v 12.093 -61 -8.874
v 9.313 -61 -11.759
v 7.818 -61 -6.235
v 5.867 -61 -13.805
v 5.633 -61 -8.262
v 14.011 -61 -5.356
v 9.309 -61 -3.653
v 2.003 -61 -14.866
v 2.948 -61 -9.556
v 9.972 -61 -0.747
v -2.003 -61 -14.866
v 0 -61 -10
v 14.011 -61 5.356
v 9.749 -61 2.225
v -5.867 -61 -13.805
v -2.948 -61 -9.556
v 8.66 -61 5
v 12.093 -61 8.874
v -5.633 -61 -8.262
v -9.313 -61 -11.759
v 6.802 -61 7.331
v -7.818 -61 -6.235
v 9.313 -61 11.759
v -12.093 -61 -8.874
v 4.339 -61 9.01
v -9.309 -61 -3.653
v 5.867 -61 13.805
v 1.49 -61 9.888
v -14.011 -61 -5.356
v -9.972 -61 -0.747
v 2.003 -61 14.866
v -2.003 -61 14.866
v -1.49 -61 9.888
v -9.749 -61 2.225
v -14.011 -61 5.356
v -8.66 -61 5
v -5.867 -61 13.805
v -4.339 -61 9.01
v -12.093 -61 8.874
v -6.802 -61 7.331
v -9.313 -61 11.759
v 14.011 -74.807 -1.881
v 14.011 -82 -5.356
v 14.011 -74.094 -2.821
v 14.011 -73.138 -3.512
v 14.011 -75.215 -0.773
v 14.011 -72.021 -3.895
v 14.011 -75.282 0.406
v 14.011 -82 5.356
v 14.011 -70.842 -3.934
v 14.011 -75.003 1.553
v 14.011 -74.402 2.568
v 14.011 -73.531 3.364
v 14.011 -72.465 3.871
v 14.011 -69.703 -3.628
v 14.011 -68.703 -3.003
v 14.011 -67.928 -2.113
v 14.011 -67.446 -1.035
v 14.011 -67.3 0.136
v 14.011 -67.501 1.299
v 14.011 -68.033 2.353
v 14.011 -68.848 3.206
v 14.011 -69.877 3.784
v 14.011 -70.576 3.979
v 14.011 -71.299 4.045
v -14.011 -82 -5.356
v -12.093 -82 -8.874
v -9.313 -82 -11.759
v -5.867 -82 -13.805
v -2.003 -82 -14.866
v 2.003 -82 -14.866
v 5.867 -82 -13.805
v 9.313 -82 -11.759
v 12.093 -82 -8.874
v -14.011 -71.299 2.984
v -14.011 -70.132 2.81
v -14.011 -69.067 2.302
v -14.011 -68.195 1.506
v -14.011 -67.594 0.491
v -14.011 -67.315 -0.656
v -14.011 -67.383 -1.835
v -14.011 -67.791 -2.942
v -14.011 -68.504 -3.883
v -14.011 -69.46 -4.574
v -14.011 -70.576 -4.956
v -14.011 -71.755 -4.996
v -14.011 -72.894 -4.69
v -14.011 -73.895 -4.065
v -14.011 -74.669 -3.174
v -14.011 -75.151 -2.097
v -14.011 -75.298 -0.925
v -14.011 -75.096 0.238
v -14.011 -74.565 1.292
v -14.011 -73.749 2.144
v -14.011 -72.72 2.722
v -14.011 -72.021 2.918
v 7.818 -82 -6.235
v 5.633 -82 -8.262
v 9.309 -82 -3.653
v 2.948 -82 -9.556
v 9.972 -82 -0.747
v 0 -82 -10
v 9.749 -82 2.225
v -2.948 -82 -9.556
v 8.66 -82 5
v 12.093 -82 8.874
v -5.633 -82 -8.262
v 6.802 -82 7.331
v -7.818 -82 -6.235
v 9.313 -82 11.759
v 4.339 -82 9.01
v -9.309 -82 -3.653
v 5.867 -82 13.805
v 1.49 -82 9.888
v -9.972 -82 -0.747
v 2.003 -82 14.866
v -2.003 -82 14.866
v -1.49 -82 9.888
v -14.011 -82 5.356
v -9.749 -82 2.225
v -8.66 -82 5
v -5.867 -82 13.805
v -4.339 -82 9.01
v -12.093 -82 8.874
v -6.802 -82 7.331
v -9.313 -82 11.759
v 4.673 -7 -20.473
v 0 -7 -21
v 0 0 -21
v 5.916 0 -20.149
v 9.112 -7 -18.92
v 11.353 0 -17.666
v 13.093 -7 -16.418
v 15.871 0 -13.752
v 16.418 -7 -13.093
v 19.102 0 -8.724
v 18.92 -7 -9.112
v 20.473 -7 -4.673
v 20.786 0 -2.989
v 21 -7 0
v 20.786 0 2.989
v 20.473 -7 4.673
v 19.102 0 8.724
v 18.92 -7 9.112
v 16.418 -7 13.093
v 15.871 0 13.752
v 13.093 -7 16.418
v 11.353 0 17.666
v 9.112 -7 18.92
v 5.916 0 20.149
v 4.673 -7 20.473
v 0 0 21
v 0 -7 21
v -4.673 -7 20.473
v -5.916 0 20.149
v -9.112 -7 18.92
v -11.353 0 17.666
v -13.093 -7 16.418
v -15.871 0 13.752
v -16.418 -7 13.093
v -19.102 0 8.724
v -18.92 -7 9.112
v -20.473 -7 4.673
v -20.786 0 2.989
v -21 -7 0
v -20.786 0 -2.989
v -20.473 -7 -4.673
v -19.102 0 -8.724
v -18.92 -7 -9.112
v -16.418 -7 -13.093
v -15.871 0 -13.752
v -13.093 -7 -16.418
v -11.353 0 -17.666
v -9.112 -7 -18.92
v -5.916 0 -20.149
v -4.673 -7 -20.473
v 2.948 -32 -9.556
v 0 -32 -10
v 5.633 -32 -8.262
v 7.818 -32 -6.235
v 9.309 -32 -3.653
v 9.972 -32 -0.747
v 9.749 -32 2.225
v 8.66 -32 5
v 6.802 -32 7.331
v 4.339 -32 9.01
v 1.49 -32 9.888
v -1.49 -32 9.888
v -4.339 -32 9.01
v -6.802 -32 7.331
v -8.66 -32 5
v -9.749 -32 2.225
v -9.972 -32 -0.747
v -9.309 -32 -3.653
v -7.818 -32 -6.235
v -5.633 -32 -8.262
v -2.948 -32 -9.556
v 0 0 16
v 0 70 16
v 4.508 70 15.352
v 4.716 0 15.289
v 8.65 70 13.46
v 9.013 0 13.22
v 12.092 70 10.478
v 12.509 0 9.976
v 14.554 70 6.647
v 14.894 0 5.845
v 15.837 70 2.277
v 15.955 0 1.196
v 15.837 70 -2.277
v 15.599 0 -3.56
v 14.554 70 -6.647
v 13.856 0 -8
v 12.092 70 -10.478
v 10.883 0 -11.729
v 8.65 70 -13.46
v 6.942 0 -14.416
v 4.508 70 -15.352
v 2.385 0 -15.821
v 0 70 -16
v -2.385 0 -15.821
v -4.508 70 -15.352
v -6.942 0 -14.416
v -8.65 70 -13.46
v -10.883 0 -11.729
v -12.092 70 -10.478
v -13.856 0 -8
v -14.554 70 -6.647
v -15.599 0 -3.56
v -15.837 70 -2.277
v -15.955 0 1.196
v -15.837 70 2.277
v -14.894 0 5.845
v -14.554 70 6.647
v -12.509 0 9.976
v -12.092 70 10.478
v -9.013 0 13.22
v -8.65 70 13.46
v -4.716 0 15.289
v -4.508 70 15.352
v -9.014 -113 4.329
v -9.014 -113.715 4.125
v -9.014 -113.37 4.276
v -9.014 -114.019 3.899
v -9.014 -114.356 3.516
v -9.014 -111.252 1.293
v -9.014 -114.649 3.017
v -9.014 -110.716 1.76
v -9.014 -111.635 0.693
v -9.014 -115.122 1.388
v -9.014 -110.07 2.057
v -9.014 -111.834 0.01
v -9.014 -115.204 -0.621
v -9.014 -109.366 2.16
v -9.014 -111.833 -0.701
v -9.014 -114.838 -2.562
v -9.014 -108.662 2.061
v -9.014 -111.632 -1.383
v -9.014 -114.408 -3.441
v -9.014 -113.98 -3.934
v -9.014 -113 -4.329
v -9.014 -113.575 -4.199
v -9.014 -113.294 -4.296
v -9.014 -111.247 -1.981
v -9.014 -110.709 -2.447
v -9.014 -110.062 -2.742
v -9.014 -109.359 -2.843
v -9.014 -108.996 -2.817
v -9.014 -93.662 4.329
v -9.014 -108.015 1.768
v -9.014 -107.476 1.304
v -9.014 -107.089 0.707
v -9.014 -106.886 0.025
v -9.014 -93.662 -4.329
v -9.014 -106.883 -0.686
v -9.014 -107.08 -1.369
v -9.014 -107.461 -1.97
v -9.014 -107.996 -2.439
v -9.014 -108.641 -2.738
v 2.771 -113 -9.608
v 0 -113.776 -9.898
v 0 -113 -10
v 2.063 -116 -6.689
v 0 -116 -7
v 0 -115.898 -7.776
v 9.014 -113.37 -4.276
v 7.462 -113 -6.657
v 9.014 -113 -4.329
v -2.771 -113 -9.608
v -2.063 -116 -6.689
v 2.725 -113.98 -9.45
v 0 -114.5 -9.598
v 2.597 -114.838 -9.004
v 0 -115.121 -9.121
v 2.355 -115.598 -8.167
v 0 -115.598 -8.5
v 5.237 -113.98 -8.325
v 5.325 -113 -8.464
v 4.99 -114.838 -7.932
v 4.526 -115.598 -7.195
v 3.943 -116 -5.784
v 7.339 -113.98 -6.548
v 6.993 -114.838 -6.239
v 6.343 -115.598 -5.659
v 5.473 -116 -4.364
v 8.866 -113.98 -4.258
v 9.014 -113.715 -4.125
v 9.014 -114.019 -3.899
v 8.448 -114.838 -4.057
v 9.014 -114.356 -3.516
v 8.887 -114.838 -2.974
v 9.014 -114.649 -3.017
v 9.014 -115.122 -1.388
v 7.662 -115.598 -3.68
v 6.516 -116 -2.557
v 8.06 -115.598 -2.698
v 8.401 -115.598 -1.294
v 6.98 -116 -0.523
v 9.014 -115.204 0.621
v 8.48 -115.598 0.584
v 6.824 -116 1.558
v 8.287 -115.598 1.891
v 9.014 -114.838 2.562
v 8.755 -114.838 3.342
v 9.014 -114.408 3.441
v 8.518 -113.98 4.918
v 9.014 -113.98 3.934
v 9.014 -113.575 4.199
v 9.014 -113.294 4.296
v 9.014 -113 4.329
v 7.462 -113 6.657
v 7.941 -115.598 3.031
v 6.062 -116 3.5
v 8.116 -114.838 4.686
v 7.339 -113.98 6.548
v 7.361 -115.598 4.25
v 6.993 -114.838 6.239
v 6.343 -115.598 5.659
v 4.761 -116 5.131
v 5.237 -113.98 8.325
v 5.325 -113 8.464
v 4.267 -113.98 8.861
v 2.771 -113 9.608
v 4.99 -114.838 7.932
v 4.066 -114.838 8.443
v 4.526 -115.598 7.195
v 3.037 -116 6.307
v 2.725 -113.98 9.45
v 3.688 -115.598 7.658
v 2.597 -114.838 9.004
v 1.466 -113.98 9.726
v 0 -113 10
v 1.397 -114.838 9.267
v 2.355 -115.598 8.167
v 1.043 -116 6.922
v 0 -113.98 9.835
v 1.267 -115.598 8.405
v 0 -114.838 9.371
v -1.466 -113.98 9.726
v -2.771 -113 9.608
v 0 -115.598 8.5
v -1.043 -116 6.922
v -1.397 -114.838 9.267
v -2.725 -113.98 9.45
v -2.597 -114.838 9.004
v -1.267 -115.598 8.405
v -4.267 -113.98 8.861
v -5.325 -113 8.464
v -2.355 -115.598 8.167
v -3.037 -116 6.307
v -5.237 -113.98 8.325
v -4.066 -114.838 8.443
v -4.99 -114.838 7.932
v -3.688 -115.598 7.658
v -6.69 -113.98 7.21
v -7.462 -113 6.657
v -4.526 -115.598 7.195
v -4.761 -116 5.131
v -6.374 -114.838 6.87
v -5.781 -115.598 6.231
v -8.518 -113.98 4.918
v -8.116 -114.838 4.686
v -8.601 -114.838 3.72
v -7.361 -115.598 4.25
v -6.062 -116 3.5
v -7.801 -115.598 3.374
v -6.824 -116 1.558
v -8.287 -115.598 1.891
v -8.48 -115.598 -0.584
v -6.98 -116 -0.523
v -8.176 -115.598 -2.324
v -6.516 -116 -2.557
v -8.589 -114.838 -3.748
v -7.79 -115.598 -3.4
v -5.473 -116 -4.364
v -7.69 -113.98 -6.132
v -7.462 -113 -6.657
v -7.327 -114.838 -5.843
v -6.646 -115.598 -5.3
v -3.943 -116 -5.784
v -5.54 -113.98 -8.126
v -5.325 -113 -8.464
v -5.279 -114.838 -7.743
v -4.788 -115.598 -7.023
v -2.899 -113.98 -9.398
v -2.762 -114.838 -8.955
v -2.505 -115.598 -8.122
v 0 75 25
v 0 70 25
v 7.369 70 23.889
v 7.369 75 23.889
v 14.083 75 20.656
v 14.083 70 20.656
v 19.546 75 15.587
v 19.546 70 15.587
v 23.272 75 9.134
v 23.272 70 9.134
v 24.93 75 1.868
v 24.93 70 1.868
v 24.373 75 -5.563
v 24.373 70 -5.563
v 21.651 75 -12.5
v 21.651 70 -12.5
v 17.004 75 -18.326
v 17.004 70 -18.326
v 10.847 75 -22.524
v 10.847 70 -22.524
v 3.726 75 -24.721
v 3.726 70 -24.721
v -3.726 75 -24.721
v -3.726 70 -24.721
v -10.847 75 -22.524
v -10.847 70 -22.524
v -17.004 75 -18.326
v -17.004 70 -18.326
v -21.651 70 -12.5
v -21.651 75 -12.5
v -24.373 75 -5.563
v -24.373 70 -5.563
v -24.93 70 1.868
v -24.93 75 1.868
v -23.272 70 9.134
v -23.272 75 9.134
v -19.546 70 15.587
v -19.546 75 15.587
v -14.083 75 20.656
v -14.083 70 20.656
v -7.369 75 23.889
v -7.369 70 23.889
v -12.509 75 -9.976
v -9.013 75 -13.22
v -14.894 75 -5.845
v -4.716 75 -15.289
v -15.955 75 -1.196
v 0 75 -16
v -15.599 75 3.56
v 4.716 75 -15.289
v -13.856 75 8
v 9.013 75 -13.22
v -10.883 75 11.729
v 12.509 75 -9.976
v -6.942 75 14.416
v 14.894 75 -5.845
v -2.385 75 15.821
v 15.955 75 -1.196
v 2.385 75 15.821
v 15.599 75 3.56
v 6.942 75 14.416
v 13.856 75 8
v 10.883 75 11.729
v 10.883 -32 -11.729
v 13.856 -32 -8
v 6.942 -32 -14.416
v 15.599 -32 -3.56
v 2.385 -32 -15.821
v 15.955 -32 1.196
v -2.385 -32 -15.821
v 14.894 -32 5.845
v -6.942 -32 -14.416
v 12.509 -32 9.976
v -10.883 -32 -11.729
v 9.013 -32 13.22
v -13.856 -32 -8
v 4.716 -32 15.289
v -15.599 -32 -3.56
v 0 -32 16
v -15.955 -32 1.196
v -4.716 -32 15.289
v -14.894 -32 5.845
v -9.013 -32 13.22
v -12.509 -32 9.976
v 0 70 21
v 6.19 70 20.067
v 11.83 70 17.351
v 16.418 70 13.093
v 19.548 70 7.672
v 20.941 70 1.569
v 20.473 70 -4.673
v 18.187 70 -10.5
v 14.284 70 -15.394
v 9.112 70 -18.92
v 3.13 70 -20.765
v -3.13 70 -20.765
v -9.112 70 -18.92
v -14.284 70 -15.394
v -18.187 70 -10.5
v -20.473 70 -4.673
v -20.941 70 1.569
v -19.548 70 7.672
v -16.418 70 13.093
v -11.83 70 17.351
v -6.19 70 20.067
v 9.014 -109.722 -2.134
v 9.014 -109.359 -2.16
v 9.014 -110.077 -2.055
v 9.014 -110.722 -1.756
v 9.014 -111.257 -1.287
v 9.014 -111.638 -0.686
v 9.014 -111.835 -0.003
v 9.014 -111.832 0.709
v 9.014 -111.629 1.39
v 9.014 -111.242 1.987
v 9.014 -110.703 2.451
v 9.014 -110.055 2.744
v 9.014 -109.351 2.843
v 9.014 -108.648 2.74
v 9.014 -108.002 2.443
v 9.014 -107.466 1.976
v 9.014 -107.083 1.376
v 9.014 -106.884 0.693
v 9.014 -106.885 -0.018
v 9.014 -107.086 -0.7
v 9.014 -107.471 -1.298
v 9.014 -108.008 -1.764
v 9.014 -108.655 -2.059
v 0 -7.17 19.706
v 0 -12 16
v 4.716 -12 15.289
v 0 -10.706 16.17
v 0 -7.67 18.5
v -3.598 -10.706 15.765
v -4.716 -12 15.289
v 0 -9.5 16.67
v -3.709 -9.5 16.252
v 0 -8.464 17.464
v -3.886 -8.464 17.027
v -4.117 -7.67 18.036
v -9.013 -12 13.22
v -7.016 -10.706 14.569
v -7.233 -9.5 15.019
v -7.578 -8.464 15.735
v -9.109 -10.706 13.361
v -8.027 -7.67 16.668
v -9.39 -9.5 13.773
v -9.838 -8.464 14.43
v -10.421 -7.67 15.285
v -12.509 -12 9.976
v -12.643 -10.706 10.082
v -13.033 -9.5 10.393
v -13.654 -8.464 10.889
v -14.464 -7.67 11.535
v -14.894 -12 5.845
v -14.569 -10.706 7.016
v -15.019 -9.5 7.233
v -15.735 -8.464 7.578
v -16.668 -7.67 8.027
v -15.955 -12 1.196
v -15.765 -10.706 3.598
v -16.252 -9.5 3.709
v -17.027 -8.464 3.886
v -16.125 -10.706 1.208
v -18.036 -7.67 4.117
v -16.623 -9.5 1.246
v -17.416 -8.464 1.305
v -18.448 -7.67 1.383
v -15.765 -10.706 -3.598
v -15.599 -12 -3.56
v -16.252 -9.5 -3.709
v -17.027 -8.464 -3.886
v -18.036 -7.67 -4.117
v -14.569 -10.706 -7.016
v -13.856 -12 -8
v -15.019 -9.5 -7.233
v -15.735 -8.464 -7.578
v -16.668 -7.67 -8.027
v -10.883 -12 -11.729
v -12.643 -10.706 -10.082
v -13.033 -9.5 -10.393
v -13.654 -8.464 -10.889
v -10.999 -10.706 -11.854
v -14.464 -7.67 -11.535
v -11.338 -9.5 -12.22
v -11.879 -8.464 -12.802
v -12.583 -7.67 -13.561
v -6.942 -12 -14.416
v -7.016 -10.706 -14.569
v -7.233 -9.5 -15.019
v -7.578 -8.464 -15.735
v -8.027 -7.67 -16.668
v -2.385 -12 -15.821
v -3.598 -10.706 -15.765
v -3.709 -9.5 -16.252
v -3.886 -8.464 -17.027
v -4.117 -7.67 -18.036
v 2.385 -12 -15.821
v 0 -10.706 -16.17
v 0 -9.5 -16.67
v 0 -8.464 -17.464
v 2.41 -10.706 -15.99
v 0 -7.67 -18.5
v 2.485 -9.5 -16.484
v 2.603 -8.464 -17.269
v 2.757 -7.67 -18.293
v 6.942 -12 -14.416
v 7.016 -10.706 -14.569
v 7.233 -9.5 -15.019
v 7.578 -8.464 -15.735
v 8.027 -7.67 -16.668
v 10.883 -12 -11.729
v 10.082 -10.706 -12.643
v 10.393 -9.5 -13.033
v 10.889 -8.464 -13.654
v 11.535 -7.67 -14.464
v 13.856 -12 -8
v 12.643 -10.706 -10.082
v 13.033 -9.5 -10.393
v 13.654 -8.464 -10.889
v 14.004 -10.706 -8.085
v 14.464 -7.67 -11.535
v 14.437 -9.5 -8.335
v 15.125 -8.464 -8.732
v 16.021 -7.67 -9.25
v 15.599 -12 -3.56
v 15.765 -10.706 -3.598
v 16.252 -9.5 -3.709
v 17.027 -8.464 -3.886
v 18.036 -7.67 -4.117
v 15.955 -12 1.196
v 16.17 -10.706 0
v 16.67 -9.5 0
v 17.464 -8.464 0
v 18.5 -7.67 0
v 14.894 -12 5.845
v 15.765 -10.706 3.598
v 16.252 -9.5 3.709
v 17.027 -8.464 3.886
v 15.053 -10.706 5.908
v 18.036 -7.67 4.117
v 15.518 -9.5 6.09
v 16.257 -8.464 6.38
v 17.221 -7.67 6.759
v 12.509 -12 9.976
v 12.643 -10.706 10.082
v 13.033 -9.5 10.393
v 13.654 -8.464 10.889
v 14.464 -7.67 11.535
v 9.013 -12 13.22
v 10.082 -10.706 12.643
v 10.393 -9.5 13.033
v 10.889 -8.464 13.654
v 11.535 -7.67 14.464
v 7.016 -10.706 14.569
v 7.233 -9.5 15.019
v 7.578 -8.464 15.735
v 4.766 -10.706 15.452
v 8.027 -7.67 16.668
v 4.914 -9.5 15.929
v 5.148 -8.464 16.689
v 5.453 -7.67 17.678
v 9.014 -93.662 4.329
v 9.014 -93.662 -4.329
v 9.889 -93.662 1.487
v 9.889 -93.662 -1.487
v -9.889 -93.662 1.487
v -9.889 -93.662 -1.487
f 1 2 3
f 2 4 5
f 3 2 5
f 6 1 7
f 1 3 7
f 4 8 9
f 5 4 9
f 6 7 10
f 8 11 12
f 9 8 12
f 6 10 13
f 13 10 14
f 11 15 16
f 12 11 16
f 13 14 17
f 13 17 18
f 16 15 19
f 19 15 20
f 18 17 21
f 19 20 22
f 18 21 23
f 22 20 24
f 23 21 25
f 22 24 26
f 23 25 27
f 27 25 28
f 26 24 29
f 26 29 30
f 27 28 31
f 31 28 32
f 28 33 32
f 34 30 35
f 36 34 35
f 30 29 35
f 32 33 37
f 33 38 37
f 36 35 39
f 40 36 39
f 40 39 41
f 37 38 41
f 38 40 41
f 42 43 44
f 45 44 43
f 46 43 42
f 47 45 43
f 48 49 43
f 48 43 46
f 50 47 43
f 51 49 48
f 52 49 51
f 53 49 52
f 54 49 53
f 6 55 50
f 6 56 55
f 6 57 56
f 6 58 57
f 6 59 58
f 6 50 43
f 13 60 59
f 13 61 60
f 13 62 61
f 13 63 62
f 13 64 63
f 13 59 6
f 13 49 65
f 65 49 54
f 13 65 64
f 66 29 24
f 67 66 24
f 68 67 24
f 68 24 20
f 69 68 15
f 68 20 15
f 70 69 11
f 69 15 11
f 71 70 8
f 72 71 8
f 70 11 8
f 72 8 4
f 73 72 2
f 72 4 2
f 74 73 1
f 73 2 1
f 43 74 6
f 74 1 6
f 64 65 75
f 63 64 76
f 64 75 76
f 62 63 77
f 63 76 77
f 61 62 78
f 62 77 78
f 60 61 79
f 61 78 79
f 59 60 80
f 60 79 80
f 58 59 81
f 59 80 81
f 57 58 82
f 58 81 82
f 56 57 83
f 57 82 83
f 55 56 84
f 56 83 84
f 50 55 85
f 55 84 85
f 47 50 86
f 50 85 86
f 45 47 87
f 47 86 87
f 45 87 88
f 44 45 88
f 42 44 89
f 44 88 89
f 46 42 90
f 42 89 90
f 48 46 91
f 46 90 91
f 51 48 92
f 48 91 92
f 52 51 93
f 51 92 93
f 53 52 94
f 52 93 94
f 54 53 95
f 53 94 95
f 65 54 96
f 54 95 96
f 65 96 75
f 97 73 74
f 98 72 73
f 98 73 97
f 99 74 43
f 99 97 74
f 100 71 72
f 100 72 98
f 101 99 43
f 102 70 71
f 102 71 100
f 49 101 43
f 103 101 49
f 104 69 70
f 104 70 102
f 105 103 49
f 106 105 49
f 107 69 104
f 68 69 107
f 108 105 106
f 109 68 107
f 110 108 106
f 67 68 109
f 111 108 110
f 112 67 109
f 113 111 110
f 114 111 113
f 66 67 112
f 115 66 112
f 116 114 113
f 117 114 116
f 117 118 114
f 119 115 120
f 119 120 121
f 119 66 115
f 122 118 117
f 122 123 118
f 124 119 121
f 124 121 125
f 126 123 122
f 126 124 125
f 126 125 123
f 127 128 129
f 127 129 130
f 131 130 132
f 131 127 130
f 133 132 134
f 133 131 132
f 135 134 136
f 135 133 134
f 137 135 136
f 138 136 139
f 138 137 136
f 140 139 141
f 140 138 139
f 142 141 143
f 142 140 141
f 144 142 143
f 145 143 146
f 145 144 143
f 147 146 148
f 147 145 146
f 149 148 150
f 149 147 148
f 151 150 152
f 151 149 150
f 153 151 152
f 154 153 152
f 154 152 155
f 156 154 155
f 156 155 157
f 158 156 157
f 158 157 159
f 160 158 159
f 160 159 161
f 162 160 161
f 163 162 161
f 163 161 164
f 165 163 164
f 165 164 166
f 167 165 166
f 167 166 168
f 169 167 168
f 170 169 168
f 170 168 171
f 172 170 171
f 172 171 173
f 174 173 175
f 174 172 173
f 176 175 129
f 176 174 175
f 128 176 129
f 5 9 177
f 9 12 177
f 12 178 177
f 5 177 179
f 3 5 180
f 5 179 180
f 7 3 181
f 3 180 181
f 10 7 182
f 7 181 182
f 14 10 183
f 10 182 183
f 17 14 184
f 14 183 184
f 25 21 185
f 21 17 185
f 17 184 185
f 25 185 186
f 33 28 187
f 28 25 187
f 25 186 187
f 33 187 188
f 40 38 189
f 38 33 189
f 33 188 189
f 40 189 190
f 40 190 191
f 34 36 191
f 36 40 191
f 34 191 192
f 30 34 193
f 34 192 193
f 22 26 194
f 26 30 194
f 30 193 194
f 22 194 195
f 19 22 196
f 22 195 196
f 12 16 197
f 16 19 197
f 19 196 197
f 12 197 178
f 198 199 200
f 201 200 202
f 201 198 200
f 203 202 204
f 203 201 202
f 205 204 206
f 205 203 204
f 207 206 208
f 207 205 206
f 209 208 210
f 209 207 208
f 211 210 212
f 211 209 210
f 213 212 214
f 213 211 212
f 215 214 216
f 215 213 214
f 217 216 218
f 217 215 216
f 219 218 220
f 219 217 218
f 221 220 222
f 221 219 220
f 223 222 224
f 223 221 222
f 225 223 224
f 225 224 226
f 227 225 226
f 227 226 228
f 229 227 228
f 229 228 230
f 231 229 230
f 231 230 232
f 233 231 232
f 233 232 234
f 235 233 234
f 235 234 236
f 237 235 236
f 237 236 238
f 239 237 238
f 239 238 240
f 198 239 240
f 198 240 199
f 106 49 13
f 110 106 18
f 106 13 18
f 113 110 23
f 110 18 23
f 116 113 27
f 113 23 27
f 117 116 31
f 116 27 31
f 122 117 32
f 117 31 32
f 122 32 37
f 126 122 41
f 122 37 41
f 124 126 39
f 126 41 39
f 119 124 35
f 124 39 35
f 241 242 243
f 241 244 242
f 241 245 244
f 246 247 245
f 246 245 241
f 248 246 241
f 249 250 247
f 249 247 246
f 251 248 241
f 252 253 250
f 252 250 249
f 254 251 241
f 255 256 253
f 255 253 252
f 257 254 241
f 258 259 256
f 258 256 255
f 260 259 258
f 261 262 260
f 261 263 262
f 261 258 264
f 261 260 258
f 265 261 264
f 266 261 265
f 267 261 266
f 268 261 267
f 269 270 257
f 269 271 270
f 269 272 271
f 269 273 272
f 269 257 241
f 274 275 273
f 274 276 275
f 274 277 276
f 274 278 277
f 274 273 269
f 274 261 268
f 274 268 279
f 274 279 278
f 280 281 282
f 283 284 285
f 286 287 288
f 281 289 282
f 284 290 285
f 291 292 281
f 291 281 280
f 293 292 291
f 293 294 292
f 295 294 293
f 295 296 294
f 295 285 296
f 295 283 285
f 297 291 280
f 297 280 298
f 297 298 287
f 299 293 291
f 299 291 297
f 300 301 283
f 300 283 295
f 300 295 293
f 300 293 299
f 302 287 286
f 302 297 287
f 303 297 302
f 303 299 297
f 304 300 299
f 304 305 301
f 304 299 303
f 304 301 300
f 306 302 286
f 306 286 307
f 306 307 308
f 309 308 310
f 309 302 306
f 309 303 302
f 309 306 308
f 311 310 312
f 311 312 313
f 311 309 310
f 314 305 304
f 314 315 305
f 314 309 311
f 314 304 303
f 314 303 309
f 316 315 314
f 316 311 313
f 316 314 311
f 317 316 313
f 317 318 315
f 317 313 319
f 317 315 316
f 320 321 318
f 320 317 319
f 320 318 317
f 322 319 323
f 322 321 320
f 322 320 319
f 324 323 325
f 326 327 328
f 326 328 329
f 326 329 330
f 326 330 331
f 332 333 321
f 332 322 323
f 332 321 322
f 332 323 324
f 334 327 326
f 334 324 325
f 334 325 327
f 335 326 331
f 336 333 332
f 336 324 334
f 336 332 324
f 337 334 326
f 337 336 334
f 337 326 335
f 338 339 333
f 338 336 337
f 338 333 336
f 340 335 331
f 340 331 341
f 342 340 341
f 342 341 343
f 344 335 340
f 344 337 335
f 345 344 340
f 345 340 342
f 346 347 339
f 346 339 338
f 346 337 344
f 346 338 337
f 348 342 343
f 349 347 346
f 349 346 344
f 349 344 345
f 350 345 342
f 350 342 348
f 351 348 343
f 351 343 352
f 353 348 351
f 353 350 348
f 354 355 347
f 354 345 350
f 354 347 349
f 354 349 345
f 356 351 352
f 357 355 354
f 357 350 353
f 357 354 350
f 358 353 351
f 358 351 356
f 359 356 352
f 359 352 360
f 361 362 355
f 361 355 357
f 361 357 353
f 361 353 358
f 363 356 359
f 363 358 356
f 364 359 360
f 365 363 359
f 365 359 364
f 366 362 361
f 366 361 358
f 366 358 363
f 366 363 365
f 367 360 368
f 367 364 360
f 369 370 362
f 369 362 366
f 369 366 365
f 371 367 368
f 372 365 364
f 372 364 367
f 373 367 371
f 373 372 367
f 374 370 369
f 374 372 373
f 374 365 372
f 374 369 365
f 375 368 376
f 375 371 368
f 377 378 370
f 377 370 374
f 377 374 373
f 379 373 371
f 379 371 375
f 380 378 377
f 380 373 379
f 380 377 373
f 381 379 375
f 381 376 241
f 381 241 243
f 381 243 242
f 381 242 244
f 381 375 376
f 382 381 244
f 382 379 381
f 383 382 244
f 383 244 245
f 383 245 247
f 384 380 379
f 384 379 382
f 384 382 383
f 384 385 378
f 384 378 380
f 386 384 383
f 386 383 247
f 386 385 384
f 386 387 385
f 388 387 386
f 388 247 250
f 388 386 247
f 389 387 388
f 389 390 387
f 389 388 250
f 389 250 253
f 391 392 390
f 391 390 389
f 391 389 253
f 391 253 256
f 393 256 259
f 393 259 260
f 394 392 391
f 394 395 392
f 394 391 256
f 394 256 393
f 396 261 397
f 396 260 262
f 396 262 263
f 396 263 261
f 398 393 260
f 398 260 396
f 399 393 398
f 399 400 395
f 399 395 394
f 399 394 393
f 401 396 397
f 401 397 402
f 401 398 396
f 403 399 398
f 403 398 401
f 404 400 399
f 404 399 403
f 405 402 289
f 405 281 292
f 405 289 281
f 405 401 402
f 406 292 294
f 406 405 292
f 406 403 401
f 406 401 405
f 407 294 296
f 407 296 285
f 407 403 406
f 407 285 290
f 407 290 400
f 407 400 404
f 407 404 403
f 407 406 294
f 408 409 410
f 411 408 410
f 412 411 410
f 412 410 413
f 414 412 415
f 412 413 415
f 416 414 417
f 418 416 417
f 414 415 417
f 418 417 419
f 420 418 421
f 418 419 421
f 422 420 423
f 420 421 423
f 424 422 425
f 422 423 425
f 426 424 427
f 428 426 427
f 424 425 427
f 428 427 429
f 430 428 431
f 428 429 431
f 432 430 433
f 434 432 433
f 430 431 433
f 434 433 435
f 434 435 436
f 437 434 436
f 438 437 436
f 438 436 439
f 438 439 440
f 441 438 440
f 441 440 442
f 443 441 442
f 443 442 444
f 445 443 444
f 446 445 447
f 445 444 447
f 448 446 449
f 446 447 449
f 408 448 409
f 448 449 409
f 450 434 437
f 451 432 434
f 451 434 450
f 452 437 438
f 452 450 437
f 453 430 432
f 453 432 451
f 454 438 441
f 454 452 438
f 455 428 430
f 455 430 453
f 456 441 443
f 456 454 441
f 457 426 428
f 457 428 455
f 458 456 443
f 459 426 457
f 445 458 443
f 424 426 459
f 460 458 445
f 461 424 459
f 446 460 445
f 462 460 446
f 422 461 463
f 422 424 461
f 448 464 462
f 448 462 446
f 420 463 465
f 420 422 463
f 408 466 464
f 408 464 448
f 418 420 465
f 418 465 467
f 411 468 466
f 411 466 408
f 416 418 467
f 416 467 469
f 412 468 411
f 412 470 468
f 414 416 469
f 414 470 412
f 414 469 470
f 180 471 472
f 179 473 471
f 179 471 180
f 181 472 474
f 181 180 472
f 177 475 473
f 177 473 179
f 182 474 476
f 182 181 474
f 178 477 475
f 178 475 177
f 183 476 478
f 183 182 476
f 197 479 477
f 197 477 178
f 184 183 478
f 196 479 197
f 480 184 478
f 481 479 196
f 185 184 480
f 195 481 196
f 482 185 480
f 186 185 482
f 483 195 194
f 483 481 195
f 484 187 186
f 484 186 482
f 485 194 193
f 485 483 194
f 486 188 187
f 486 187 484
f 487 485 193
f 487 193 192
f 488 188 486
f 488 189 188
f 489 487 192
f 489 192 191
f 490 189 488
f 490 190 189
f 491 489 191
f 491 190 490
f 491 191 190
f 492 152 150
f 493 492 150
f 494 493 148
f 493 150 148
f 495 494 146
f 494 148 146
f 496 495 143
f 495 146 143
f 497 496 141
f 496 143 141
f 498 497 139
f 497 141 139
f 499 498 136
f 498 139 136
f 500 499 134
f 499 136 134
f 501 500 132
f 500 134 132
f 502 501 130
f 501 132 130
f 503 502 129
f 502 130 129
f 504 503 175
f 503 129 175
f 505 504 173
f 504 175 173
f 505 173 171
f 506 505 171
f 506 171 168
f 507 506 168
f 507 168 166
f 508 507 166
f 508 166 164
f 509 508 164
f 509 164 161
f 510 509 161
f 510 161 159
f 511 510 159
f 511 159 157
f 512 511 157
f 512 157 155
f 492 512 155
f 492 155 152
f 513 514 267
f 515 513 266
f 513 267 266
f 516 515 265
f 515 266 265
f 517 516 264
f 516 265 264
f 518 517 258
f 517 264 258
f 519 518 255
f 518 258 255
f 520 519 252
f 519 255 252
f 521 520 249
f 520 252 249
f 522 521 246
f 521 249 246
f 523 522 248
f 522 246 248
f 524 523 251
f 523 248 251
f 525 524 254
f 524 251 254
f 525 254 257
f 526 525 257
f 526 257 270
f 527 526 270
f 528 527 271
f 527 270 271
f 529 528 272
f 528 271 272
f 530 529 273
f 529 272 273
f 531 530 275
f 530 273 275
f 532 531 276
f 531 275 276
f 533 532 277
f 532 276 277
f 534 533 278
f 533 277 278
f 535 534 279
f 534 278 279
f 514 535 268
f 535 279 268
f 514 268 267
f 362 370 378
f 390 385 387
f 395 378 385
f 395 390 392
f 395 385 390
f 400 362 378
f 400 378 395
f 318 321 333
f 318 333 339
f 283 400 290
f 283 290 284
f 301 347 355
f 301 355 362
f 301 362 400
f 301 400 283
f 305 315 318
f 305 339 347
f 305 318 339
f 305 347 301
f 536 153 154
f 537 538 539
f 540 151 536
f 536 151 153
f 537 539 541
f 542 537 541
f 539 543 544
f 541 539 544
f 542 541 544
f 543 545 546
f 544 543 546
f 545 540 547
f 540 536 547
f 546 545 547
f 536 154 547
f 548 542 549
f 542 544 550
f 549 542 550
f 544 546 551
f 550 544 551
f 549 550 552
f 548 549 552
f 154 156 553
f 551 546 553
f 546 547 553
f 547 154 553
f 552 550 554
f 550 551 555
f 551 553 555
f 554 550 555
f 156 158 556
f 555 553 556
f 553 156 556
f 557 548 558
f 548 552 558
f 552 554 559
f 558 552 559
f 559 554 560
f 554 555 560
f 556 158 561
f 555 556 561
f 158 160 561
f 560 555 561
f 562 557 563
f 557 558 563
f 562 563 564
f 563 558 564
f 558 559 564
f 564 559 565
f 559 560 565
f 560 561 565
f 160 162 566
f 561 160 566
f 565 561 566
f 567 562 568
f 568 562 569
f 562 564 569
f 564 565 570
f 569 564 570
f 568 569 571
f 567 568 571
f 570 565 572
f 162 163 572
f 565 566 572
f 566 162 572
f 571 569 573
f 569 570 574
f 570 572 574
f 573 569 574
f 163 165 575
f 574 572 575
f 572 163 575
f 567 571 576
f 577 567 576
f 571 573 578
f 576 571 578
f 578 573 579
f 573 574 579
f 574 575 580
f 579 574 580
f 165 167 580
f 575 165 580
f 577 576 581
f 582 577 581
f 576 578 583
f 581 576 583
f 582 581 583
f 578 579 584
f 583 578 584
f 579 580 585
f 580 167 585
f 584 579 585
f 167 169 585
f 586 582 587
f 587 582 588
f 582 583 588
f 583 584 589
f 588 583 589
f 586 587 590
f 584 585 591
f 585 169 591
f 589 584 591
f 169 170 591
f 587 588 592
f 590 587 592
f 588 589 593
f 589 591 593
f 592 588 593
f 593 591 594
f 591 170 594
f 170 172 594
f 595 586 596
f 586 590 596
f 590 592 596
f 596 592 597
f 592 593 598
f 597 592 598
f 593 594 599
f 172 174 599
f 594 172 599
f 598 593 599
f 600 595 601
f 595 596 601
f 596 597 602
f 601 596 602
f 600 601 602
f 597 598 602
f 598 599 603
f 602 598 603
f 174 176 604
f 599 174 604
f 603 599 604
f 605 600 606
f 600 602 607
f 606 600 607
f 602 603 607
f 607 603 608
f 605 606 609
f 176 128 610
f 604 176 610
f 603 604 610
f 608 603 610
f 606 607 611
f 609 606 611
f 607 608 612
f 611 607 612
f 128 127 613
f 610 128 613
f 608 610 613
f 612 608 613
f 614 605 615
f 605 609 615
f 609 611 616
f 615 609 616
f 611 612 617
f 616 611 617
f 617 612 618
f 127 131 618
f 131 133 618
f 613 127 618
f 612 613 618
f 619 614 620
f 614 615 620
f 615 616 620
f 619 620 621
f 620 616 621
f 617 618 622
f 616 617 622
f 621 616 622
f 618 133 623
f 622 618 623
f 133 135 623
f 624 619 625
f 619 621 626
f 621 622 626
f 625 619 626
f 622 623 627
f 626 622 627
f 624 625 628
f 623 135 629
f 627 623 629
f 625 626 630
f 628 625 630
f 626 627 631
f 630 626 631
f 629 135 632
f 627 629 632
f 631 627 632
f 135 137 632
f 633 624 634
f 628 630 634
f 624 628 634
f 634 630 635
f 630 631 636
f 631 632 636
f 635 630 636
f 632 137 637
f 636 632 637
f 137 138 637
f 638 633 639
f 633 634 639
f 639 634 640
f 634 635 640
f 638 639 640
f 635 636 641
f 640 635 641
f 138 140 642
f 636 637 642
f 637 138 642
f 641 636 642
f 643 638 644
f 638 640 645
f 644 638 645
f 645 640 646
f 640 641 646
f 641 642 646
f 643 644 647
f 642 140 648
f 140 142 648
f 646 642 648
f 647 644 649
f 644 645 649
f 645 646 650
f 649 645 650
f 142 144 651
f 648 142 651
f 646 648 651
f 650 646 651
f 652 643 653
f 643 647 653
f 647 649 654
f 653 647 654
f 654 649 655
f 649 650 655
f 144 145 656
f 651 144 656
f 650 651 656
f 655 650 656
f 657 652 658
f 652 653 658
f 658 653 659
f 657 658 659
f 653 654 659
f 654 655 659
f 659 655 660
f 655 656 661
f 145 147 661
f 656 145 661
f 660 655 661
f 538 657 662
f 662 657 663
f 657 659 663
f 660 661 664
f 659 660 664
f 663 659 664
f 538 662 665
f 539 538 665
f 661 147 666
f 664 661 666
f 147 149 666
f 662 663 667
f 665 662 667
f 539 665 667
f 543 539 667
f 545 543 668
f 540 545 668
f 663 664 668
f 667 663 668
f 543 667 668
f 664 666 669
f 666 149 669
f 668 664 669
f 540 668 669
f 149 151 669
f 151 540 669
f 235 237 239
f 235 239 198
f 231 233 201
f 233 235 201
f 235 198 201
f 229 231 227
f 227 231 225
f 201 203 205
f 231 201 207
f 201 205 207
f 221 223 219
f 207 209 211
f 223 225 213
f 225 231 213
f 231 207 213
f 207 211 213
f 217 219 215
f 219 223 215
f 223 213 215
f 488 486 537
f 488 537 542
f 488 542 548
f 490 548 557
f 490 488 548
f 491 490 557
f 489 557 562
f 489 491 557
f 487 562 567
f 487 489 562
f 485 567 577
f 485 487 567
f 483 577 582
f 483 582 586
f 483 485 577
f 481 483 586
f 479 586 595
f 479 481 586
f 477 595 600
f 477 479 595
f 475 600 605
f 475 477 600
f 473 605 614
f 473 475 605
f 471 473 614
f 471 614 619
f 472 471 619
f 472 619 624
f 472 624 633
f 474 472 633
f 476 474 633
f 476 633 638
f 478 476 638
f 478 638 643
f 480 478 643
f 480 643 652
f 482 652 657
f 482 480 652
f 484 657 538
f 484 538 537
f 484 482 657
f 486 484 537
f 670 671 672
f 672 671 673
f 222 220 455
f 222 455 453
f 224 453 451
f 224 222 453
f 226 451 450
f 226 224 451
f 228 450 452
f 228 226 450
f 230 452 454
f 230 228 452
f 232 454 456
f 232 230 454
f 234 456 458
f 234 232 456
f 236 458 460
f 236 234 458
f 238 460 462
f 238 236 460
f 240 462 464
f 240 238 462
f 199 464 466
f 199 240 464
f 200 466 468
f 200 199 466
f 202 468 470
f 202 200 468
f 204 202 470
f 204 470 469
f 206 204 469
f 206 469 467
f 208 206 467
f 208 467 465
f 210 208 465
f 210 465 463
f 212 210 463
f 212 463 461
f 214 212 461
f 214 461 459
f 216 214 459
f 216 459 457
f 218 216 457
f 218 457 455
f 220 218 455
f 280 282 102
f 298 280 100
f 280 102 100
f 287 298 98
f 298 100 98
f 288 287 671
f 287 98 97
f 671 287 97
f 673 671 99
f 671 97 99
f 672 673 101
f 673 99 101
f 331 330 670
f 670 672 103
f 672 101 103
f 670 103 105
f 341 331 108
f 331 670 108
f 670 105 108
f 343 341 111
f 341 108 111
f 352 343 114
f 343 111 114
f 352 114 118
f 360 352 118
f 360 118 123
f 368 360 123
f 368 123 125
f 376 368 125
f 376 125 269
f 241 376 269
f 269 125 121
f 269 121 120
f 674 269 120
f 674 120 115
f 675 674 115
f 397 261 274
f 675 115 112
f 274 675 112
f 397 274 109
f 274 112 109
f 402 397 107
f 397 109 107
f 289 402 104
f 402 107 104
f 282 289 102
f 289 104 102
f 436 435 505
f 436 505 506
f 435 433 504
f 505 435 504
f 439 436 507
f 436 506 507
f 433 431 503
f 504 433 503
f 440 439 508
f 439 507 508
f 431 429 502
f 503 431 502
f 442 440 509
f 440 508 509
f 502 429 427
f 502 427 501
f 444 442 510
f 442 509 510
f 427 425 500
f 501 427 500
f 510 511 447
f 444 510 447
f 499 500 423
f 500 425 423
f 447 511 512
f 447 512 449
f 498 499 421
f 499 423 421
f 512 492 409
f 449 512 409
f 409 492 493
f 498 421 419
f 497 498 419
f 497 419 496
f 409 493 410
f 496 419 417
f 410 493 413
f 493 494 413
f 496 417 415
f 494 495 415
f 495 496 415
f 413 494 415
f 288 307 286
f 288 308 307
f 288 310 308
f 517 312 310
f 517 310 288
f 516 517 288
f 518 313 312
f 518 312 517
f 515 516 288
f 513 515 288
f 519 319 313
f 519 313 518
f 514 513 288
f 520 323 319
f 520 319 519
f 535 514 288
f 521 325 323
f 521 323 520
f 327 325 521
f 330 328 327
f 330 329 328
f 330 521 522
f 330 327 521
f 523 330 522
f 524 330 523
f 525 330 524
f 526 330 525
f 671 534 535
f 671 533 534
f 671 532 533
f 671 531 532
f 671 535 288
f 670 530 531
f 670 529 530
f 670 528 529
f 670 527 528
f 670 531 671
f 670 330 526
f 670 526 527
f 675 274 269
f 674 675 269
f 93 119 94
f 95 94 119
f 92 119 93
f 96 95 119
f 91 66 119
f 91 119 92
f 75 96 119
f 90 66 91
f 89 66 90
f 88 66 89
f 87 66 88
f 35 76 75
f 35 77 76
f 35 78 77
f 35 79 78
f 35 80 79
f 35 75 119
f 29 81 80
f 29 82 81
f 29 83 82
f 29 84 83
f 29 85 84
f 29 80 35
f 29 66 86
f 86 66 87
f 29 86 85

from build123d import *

# Parameters (mm, degrees)
SKETCH_1_R          = 21
SKETCH_1_R_2        = 16
EXTRUDE_1_DEPTH     = 70
EXTRUDE_START       = 7
SKETCH_3_R          = 21
EXTRUDE_2_DEPTH     = 7
SKETCH_4_R          = 10
EXTRUDE_3_DEPTH     = 109
FILLET_4_R          = 3
SKETCH_5_W          = 7.833460296
SKETCH_5_H          = 29.006841396
CUT_EXTRUDE_1_DEPTH = 38
SKETCH_9_R          = 2.5
CUT_EXTRUDE_3_DEPTH = 77.5
EXTRUDE_START_2     = 25
SKETCH_10_R         = 16
EXTRUDE_4_DEPTH     = 25
FILLET_5_R          = 5
SKETCH_11_R         = 25
SKETCH_11_R_2       = 16
EXTRUDE_5_DEPTH     = 5
SKETCH_14_R         = 15
EXTRUDE_6_DEPTH     = 21
SKETCH_7_R          = 4.000000002
CUT_EXTRUDE_2_DEPTH = 77.5
SKETCH_15_W         = 9.449953832
SKETCH_15_H         = 32.068314676
CUT_EXTRUDE_4_DEPTH = 25.5


with BuildPart() as part:
    # Эскиз1 → Вытянуть1 (new body)
    with BuildSketch(Plane(origin=(0, 0, 0), x_dir=(1, 0, 0), z_dir=(0, 1, 0))):
        with Locations(Location((0, 0, 0), (0, 0, 270))):
            Circle(SKETCH_1_R)
        with Locations(Location((0, 0, 0), (0, 0, 270))):
            Circle(SKETCH_1_R_2, mode=Mode.SUBTRACT)
    extrude(amount=EXTRUDE_1_DEPTH)

    # Эскиз3 → Вытянуть2 (add)
    with BuildSketch(Plane.XZ.offset(EXTRUDE_START)):
        with Locations(Location((0, 0, 0), (0, 0, 270))):
            Circle(SKETCH_3_R)
    extrude(amount=-EXTRUDE_2_DEPTH)

    # Эскиз4 → Вытянуть3 (add)
    with BuildSketch(Plane.XZ.offset(7)):
        with Locations(Location((0, 0, 0), (0, 0, 270))):
            Circle(SKETCH_4_R)
    extrude(amount=EXTRUDE_3_DEPTH)

    # Скругление4
    fillet_4_edges = [part.edges().sort_by_distance(p)[0] for p in [
        (0, -116, 10),
    ]]
    fillet(fillet_4_edges, radius=FILLET_4_R)

    # Эскиз5 → Вырез-Вытянуть1 (cut, symmetric)
    with BuildSketch(Plane.XY):
        with Locations((-12.931100354, -108.165099948)):
            Rectangle(SKETCH_5_W, SKETCH_5_H)
        with Locations((12.931100354, -108.165099948)):
            Rectangle(SKETCH_5_W, SKETCH_5_H)
    extrude(amount=CUT_EXTRUDE_1_DEPTH, both=True, mode=Mode.SUBTRACT)

    # Эскиз9 → Вырез-Вытянуть3 (cut, symmetric)
    with BuildSketch(Plane(origin=(-27.016636389, 0, -1.023584716), x_dir=(-0.03786003720910068, 0, 0.9992830517838905), z_dir=(-0.9992830517838904, 0, -0.03786003720910067))):
        with Locations(Location((-3.61e-07, -109.358787083, 0), (0, 0, 180))):
            Circle(SKETCH_9_R)
    extrude(amount=CUT_EXTRUDE_3_DEPTH, both=True, mode=Mode.SUBTRACT)

    # Эскиз10 → Вытянуть4 (add)
    with BuildSketch(Plane.XZ.offset(7).offset(EXTRUDE_START_2)):
        with Locations(Location((0, 0, 0), (0, 0, 90))):
            Circle(SKETCH_10_R)
    extrude(amount=-EXTRUDE_4_DEPTH)

    # Скругление5
    fillet_5_edges = [part.edges().sort_by_distance(p)[0] for p in [
        (0, -7, -16),
    ]]
    fillet(fillet_5_edges, radius=FILLET_5_R - 0.0001)  # a hair under: the kernel refuses the full size

    # Эскиз11 → Вытянуть5 (add)
    with BuildSketch(Plane(origin=(0, 70, 0), x_dir=(1, 0, 0), z_dir=(0, 1, 0))):
        with Locations(Location((0, 0, 0), (0, 0, 270))):
            Circle(SKETCH_11_R)
        with Locations(Location((0, 0, 0), (0, 0, 90))):
            Circle(SKETCH_11_R_2, mode=Mode.SUBTRACT)
    extrude(amount=EXTRUDE_5_DEPTH)

    # Эскиз14 → Вытянуть6 (add)
    with BuildSketch(Plane.XZ.offset(61)):
        with Locations(Location((0, 0, 0), (0, 0, 90))):
            Circle(SKETCH_14_R)
    extrude(amount=EXTRUDE_6_DEPTH)

    # Эскиз7 → Вырез-Вытянуть2 (cut, symmetric)
    with BuildSketch(Plane(origin=(-26.476014958, 0, -1.003102084), x_dir=(-0.037860037209100694, 0, 0.9992830517838905), z_dir=(-0.9992830517838904, 0, -0.03786003720910069))):
        with Locations((-0.488081216, -71.29866531)):
            Circle(SKETCH_7_R)
    extrude(amount=CUT_EXTRUDE_2_DEPTH, both=True, mode=Mode.SUBTRACT)

    # Эскиз15 → Вырез-Вытянуть4 (cut, symmetric)
    with BuildSketch(Plane.XY):
        with Locations((-18.736164954, -71.146680529)):
            Rectangle(SKETCH_15_W, SKETCH_15_H)
        with Locations((18.736164954, -71.146680529)):
            Rectangle(SKETCH_15_W, SKETCH_15_H)
    extrude(amount=CUT_EXTRUDE_4_DEPTH, both=True, mode=Mode.SUBTRACT)


solid = part.part
